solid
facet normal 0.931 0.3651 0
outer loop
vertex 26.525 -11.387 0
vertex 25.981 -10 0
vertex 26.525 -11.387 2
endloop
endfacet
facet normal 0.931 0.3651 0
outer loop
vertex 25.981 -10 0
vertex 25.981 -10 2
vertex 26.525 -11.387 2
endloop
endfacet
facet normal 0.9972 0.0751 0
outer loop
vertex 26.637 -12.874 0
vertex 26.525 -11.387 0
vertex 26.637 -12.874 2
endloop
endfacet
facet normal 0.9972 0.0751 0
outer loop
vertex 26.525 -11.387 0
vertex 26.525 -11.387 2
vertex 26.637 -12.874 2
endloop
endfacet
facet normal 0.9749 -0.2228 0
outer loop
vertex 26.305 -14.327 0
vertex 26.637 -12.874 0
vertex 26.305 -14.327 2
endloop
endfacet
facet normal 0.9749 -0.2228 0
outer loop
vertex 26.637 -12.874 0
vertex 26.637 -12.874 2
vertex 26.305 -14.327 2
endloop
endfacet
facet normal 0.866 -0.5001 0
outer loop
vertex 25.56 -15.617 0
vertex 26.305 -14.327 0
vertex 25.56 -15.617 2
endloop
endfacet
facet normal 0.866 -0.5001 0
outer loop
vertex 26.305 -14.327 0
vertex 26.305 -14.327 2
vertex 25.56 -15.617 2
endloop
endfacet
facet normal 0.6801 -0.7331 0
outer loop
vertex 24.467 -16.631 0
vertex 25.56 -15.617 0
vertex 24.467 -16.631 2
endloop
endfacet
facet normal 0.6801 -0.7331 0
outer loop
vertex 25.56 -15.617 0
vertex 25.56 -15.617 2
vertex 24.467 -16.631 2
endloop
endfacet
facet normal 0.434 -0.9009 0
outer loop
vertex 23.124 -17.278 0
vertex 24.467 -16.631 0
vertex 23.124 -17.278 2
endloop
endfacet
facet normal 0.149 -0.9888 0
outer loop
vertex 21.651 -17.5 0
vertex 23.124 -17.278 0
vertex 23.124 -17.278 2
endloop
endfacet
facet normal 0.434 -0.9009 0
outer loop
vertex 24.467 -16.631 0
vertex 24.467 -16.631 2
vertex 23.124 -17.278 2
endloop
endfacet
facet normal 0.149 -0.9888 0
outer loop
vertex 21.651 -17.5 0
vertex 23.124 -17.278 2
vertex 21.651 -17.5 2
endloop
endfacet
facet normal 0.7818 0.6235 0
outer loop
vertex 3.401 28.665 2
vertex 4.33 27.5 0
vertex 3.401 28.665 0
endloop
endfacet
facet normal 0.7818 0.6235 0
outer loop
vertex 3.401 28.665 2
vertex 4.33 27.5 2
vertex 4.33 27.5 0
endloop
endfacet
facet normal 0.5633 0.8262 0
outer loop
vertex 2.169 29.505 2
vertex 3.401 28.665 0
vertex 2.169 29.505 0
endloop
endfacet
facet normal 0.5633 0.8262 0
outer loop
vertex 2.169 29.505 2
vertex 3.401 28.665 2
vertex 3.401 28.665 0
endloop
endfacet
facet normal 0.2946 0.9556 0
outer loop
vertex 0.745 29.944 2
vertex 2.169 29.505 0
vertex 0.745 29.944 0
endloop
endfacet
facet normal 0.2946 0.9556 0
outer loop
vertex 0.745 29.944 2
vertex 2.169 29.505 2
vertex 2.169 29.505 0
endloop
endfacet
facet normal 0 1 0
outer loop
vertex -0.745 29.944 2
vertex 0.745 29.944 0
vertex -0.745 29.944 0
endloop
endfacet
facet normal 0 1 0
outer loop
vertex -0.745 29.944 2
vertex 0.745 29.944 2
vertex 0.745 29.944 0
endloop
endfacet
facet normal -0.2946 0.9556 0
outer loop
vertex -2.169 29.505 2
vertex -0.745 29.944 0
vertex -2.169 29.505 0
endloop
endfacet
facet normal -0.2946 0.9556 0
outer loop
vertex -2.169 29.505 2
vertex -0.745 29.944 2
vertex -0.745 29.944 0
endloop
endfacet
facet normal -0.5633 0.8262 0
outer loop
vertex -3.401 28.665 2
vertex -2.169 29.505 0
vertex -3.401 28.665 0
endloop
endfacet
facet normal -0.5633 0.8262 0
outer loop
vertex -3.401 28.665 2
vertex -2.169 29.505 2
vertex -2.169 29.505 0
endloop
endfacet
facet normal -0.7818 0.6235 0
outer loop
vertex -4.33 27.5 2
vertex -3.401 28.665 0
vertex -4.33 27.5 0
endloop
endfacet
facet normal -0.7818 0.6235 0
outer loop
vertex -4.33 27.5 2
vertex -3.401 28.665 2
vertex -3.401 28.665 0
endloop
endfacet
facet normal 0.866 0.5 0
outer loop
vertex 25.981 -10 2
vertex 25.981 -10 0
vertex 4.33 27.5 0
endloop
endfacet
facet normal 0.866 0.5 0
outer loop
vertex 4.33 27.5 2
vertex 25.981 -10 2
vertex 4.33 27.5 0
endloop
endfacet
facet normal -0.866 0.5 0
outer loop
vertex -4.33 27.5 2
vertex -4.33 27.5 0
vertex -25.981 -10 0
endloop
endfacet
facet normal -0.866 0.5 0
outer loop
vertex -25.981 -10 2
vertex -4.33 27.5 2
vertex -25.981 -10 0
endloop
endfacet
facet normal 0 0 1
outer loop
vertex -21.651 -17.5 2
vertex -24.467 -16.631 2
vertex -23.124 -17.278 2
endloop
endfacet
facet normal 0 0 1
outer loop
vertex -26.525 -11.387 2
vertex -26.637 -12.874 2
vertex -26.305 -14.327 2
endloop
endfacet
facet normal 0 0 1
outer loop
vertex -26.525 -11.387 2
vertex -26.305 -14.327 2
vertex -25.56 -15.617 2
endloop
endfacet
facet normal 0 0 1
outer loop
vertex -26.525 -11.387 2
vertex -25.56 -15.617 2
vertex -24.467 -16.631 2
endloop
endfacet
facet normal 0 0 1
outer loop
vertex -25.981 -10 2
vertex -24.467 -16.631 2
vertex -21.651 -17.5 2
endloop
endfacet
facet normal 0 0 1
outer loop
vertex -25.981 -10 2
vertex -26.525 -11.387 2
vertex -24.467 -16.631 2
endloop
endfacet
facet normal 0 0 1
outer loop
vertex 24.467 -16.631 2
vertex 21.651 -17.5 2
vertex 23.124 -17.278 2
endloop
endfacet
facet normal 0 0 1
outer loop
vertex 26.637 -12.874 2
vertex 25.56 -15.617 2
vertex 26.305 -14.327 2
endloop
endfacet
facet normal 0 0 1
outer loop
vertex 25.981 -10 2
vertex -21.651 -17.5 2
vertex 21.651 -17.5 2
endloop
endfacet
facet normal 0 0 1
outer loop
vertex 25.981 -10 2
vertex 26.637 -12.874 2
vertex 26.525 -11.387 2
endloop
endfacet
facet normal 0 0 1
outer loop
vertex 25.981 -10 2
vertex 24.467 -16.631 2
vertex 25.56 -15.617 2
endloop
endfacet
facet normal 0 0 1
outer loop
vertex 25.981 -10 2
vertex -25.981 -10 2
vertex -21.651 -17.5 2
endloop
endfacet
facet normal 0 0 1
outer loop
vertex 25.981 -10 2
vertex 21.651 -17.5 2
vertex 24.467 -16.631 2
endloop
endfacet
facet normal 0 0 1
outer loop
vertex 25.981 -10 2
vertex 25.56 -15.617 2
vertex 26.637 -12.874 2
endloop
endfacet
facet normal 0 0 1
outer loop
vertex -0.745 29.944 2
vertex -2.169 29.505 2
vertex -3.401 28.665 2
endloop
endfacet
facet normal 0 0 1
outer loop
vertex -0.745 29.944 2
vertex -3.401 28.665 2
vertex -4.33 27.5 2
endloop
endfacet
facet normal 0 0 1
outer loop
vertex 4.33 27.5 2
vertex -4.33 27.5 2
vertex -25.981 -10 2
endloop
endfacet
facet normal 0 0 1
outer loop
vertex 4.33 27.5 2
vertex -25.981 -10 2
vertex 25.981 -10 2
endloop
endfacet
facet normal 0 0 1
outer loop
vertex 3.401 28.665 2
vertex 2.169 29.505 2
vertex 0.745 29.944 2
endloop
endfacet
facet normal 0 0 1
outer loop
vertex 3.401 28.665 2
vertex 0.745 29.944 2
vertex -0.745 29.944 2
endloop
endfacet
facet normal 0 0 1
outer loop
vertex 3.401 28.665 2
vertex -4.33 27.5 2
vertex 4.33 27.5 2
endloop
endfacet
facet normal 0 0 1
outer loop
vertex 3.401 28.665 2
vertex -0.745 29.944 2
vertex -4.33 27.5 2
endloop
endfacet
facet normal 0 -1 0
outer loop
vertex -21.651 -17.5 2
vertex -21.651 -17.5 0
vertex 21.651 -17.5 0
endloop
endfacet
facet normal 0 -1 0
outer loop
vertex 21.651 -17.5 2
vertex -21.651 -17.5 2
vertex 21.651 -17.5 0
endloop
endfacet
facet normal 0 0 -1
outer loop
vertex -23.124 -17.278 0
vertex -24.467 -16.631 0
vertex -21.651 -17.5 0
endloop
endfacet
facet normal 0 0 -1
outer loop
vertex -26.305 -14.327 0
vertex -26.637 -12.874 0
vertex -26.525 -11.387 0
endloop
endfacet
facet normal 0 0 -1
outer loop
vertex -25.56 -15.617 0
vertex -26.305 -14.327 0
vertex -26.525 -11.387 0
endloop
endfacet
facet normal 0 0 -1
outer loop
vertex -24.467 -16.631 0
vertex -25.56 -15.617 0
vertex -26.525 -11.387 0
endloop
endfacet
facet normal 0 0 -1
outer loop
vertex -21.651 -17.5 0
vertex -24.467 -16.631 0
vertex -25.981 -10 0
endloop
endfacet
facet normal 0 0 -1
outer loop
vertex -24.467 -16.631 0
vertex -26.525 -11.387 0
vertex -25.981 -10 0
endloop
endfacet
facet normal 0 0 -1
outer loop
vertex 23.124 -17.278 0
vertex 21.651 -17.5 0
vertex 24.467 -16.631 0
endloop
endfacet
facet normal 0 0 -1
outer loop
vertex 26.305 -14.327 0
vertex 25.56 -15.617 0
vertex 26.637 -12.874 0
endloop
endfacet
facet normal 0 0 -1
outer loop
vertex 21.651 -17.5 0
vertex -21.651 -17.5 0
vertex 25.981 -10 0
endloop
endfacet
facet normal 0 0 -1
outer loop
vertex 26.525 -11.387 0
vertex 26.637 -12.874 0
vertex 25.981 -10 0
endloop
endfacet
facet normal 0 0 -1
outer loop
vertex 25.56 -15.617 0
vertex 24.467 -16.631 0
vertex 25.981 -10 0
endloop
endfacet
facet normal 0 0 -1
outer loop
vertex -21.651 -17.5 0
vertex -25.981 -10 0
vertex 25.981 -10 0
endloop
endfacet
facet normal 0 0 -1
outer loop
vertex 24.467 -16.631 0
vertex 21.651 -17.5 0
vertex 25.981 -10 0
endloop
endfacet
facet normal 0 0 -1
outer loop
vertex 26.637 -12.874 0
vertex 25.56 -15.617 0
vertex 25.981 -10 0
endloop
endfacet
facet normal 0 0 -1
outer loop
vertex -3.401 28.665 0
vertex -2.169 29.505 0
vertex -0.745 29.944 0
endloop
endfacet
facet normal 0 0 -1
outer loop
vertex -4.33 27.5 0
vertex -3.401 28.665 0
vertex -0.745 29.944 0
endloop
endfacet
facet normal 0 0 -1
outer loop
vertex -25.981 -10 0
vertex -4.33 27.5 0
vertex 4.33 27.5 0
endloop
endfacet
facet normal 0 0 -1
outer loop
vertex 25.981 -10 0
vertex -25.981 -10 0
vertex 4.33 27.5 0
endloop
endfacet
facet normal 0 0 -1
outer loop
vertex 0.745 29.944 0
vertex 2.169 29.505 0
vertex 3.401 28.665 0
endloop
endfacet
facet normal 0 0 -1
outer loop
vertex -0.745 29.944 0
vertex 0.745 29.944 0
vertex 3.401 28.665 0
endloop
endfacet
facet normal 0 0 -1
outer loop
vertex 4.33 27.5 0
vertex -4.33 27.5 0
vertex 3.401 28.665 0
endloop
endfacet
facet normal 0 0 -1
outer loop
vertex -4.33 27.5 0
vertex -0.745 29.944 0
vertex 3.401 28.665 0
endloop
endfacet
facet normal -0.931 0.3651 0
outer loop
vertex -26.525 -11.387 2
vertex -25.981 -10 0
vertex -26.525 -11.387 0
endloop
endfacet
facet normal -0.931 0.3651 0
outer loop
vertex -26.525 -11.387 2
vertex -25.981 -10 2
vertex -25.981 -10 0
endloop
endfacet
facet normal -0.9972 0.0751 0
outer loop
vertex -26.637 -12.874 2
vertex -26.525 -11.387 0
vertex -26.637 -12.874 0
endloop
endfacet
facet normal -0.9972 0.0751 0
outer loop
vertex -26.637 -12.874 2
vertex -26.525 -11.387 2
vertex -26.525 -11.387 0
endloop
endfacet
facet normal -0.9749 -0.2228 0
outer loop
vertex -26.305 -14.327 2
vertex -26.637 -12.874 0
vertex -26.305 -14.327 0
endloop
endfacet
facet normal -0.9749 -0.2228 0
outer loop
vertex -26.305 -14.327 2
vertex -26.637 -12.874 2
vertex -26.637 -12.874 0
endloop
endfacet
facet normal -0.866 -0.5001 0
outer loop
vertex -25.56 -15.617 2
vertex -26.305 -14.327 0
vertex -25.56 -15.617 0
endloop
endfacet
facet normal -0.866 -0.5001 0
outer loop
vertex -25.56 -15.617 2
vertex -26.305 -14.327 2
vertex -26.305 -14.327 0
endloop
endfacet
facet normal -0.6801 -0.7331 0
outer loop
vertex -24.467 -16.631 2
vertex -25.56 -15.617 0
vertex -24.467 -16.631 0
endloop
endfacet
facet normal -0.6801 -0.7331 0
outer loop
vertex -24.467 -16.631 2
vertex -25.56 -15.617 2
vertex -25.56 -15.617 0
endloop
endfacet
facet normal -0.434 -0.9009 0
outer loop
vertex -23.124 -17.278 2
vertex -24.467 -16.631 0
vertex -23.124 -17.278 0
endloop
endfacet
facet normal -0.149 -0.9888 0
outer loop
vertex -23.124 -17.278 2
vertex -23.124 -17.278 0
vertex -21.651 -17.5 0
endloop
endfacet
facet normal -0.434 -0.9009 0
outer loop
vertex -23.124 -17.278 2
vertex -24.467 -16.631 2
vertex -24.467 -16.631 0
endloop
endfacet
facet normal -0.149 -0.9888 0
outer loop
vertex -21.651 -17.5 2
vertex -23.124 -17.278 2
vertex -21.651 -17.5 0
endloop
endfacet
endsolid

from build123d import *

# Parameters (mm, degrees)
F1_DEPTH = 2
F2_R     = 5


with BuildPart() as f1:
    # F0 (on Top) → F1 (new body)
    with BuildSketch(Plane.XY):
        Polygon((30.310889, -17.5), (0, 35), (-30.310889, -17.5), align=None)
    extrude(amount=F1_DEPTH)

    # F2
    f2_edges = [f1.edges().sort_by_distance(p)[0] for p in [
        (0, 35, 1),
        (-30.310889, -17.5, 1),
        (30.310889, -17.5, 1),
    ]]
    fillet(f2_edges, radius=F2_R)


solid = f1.part
